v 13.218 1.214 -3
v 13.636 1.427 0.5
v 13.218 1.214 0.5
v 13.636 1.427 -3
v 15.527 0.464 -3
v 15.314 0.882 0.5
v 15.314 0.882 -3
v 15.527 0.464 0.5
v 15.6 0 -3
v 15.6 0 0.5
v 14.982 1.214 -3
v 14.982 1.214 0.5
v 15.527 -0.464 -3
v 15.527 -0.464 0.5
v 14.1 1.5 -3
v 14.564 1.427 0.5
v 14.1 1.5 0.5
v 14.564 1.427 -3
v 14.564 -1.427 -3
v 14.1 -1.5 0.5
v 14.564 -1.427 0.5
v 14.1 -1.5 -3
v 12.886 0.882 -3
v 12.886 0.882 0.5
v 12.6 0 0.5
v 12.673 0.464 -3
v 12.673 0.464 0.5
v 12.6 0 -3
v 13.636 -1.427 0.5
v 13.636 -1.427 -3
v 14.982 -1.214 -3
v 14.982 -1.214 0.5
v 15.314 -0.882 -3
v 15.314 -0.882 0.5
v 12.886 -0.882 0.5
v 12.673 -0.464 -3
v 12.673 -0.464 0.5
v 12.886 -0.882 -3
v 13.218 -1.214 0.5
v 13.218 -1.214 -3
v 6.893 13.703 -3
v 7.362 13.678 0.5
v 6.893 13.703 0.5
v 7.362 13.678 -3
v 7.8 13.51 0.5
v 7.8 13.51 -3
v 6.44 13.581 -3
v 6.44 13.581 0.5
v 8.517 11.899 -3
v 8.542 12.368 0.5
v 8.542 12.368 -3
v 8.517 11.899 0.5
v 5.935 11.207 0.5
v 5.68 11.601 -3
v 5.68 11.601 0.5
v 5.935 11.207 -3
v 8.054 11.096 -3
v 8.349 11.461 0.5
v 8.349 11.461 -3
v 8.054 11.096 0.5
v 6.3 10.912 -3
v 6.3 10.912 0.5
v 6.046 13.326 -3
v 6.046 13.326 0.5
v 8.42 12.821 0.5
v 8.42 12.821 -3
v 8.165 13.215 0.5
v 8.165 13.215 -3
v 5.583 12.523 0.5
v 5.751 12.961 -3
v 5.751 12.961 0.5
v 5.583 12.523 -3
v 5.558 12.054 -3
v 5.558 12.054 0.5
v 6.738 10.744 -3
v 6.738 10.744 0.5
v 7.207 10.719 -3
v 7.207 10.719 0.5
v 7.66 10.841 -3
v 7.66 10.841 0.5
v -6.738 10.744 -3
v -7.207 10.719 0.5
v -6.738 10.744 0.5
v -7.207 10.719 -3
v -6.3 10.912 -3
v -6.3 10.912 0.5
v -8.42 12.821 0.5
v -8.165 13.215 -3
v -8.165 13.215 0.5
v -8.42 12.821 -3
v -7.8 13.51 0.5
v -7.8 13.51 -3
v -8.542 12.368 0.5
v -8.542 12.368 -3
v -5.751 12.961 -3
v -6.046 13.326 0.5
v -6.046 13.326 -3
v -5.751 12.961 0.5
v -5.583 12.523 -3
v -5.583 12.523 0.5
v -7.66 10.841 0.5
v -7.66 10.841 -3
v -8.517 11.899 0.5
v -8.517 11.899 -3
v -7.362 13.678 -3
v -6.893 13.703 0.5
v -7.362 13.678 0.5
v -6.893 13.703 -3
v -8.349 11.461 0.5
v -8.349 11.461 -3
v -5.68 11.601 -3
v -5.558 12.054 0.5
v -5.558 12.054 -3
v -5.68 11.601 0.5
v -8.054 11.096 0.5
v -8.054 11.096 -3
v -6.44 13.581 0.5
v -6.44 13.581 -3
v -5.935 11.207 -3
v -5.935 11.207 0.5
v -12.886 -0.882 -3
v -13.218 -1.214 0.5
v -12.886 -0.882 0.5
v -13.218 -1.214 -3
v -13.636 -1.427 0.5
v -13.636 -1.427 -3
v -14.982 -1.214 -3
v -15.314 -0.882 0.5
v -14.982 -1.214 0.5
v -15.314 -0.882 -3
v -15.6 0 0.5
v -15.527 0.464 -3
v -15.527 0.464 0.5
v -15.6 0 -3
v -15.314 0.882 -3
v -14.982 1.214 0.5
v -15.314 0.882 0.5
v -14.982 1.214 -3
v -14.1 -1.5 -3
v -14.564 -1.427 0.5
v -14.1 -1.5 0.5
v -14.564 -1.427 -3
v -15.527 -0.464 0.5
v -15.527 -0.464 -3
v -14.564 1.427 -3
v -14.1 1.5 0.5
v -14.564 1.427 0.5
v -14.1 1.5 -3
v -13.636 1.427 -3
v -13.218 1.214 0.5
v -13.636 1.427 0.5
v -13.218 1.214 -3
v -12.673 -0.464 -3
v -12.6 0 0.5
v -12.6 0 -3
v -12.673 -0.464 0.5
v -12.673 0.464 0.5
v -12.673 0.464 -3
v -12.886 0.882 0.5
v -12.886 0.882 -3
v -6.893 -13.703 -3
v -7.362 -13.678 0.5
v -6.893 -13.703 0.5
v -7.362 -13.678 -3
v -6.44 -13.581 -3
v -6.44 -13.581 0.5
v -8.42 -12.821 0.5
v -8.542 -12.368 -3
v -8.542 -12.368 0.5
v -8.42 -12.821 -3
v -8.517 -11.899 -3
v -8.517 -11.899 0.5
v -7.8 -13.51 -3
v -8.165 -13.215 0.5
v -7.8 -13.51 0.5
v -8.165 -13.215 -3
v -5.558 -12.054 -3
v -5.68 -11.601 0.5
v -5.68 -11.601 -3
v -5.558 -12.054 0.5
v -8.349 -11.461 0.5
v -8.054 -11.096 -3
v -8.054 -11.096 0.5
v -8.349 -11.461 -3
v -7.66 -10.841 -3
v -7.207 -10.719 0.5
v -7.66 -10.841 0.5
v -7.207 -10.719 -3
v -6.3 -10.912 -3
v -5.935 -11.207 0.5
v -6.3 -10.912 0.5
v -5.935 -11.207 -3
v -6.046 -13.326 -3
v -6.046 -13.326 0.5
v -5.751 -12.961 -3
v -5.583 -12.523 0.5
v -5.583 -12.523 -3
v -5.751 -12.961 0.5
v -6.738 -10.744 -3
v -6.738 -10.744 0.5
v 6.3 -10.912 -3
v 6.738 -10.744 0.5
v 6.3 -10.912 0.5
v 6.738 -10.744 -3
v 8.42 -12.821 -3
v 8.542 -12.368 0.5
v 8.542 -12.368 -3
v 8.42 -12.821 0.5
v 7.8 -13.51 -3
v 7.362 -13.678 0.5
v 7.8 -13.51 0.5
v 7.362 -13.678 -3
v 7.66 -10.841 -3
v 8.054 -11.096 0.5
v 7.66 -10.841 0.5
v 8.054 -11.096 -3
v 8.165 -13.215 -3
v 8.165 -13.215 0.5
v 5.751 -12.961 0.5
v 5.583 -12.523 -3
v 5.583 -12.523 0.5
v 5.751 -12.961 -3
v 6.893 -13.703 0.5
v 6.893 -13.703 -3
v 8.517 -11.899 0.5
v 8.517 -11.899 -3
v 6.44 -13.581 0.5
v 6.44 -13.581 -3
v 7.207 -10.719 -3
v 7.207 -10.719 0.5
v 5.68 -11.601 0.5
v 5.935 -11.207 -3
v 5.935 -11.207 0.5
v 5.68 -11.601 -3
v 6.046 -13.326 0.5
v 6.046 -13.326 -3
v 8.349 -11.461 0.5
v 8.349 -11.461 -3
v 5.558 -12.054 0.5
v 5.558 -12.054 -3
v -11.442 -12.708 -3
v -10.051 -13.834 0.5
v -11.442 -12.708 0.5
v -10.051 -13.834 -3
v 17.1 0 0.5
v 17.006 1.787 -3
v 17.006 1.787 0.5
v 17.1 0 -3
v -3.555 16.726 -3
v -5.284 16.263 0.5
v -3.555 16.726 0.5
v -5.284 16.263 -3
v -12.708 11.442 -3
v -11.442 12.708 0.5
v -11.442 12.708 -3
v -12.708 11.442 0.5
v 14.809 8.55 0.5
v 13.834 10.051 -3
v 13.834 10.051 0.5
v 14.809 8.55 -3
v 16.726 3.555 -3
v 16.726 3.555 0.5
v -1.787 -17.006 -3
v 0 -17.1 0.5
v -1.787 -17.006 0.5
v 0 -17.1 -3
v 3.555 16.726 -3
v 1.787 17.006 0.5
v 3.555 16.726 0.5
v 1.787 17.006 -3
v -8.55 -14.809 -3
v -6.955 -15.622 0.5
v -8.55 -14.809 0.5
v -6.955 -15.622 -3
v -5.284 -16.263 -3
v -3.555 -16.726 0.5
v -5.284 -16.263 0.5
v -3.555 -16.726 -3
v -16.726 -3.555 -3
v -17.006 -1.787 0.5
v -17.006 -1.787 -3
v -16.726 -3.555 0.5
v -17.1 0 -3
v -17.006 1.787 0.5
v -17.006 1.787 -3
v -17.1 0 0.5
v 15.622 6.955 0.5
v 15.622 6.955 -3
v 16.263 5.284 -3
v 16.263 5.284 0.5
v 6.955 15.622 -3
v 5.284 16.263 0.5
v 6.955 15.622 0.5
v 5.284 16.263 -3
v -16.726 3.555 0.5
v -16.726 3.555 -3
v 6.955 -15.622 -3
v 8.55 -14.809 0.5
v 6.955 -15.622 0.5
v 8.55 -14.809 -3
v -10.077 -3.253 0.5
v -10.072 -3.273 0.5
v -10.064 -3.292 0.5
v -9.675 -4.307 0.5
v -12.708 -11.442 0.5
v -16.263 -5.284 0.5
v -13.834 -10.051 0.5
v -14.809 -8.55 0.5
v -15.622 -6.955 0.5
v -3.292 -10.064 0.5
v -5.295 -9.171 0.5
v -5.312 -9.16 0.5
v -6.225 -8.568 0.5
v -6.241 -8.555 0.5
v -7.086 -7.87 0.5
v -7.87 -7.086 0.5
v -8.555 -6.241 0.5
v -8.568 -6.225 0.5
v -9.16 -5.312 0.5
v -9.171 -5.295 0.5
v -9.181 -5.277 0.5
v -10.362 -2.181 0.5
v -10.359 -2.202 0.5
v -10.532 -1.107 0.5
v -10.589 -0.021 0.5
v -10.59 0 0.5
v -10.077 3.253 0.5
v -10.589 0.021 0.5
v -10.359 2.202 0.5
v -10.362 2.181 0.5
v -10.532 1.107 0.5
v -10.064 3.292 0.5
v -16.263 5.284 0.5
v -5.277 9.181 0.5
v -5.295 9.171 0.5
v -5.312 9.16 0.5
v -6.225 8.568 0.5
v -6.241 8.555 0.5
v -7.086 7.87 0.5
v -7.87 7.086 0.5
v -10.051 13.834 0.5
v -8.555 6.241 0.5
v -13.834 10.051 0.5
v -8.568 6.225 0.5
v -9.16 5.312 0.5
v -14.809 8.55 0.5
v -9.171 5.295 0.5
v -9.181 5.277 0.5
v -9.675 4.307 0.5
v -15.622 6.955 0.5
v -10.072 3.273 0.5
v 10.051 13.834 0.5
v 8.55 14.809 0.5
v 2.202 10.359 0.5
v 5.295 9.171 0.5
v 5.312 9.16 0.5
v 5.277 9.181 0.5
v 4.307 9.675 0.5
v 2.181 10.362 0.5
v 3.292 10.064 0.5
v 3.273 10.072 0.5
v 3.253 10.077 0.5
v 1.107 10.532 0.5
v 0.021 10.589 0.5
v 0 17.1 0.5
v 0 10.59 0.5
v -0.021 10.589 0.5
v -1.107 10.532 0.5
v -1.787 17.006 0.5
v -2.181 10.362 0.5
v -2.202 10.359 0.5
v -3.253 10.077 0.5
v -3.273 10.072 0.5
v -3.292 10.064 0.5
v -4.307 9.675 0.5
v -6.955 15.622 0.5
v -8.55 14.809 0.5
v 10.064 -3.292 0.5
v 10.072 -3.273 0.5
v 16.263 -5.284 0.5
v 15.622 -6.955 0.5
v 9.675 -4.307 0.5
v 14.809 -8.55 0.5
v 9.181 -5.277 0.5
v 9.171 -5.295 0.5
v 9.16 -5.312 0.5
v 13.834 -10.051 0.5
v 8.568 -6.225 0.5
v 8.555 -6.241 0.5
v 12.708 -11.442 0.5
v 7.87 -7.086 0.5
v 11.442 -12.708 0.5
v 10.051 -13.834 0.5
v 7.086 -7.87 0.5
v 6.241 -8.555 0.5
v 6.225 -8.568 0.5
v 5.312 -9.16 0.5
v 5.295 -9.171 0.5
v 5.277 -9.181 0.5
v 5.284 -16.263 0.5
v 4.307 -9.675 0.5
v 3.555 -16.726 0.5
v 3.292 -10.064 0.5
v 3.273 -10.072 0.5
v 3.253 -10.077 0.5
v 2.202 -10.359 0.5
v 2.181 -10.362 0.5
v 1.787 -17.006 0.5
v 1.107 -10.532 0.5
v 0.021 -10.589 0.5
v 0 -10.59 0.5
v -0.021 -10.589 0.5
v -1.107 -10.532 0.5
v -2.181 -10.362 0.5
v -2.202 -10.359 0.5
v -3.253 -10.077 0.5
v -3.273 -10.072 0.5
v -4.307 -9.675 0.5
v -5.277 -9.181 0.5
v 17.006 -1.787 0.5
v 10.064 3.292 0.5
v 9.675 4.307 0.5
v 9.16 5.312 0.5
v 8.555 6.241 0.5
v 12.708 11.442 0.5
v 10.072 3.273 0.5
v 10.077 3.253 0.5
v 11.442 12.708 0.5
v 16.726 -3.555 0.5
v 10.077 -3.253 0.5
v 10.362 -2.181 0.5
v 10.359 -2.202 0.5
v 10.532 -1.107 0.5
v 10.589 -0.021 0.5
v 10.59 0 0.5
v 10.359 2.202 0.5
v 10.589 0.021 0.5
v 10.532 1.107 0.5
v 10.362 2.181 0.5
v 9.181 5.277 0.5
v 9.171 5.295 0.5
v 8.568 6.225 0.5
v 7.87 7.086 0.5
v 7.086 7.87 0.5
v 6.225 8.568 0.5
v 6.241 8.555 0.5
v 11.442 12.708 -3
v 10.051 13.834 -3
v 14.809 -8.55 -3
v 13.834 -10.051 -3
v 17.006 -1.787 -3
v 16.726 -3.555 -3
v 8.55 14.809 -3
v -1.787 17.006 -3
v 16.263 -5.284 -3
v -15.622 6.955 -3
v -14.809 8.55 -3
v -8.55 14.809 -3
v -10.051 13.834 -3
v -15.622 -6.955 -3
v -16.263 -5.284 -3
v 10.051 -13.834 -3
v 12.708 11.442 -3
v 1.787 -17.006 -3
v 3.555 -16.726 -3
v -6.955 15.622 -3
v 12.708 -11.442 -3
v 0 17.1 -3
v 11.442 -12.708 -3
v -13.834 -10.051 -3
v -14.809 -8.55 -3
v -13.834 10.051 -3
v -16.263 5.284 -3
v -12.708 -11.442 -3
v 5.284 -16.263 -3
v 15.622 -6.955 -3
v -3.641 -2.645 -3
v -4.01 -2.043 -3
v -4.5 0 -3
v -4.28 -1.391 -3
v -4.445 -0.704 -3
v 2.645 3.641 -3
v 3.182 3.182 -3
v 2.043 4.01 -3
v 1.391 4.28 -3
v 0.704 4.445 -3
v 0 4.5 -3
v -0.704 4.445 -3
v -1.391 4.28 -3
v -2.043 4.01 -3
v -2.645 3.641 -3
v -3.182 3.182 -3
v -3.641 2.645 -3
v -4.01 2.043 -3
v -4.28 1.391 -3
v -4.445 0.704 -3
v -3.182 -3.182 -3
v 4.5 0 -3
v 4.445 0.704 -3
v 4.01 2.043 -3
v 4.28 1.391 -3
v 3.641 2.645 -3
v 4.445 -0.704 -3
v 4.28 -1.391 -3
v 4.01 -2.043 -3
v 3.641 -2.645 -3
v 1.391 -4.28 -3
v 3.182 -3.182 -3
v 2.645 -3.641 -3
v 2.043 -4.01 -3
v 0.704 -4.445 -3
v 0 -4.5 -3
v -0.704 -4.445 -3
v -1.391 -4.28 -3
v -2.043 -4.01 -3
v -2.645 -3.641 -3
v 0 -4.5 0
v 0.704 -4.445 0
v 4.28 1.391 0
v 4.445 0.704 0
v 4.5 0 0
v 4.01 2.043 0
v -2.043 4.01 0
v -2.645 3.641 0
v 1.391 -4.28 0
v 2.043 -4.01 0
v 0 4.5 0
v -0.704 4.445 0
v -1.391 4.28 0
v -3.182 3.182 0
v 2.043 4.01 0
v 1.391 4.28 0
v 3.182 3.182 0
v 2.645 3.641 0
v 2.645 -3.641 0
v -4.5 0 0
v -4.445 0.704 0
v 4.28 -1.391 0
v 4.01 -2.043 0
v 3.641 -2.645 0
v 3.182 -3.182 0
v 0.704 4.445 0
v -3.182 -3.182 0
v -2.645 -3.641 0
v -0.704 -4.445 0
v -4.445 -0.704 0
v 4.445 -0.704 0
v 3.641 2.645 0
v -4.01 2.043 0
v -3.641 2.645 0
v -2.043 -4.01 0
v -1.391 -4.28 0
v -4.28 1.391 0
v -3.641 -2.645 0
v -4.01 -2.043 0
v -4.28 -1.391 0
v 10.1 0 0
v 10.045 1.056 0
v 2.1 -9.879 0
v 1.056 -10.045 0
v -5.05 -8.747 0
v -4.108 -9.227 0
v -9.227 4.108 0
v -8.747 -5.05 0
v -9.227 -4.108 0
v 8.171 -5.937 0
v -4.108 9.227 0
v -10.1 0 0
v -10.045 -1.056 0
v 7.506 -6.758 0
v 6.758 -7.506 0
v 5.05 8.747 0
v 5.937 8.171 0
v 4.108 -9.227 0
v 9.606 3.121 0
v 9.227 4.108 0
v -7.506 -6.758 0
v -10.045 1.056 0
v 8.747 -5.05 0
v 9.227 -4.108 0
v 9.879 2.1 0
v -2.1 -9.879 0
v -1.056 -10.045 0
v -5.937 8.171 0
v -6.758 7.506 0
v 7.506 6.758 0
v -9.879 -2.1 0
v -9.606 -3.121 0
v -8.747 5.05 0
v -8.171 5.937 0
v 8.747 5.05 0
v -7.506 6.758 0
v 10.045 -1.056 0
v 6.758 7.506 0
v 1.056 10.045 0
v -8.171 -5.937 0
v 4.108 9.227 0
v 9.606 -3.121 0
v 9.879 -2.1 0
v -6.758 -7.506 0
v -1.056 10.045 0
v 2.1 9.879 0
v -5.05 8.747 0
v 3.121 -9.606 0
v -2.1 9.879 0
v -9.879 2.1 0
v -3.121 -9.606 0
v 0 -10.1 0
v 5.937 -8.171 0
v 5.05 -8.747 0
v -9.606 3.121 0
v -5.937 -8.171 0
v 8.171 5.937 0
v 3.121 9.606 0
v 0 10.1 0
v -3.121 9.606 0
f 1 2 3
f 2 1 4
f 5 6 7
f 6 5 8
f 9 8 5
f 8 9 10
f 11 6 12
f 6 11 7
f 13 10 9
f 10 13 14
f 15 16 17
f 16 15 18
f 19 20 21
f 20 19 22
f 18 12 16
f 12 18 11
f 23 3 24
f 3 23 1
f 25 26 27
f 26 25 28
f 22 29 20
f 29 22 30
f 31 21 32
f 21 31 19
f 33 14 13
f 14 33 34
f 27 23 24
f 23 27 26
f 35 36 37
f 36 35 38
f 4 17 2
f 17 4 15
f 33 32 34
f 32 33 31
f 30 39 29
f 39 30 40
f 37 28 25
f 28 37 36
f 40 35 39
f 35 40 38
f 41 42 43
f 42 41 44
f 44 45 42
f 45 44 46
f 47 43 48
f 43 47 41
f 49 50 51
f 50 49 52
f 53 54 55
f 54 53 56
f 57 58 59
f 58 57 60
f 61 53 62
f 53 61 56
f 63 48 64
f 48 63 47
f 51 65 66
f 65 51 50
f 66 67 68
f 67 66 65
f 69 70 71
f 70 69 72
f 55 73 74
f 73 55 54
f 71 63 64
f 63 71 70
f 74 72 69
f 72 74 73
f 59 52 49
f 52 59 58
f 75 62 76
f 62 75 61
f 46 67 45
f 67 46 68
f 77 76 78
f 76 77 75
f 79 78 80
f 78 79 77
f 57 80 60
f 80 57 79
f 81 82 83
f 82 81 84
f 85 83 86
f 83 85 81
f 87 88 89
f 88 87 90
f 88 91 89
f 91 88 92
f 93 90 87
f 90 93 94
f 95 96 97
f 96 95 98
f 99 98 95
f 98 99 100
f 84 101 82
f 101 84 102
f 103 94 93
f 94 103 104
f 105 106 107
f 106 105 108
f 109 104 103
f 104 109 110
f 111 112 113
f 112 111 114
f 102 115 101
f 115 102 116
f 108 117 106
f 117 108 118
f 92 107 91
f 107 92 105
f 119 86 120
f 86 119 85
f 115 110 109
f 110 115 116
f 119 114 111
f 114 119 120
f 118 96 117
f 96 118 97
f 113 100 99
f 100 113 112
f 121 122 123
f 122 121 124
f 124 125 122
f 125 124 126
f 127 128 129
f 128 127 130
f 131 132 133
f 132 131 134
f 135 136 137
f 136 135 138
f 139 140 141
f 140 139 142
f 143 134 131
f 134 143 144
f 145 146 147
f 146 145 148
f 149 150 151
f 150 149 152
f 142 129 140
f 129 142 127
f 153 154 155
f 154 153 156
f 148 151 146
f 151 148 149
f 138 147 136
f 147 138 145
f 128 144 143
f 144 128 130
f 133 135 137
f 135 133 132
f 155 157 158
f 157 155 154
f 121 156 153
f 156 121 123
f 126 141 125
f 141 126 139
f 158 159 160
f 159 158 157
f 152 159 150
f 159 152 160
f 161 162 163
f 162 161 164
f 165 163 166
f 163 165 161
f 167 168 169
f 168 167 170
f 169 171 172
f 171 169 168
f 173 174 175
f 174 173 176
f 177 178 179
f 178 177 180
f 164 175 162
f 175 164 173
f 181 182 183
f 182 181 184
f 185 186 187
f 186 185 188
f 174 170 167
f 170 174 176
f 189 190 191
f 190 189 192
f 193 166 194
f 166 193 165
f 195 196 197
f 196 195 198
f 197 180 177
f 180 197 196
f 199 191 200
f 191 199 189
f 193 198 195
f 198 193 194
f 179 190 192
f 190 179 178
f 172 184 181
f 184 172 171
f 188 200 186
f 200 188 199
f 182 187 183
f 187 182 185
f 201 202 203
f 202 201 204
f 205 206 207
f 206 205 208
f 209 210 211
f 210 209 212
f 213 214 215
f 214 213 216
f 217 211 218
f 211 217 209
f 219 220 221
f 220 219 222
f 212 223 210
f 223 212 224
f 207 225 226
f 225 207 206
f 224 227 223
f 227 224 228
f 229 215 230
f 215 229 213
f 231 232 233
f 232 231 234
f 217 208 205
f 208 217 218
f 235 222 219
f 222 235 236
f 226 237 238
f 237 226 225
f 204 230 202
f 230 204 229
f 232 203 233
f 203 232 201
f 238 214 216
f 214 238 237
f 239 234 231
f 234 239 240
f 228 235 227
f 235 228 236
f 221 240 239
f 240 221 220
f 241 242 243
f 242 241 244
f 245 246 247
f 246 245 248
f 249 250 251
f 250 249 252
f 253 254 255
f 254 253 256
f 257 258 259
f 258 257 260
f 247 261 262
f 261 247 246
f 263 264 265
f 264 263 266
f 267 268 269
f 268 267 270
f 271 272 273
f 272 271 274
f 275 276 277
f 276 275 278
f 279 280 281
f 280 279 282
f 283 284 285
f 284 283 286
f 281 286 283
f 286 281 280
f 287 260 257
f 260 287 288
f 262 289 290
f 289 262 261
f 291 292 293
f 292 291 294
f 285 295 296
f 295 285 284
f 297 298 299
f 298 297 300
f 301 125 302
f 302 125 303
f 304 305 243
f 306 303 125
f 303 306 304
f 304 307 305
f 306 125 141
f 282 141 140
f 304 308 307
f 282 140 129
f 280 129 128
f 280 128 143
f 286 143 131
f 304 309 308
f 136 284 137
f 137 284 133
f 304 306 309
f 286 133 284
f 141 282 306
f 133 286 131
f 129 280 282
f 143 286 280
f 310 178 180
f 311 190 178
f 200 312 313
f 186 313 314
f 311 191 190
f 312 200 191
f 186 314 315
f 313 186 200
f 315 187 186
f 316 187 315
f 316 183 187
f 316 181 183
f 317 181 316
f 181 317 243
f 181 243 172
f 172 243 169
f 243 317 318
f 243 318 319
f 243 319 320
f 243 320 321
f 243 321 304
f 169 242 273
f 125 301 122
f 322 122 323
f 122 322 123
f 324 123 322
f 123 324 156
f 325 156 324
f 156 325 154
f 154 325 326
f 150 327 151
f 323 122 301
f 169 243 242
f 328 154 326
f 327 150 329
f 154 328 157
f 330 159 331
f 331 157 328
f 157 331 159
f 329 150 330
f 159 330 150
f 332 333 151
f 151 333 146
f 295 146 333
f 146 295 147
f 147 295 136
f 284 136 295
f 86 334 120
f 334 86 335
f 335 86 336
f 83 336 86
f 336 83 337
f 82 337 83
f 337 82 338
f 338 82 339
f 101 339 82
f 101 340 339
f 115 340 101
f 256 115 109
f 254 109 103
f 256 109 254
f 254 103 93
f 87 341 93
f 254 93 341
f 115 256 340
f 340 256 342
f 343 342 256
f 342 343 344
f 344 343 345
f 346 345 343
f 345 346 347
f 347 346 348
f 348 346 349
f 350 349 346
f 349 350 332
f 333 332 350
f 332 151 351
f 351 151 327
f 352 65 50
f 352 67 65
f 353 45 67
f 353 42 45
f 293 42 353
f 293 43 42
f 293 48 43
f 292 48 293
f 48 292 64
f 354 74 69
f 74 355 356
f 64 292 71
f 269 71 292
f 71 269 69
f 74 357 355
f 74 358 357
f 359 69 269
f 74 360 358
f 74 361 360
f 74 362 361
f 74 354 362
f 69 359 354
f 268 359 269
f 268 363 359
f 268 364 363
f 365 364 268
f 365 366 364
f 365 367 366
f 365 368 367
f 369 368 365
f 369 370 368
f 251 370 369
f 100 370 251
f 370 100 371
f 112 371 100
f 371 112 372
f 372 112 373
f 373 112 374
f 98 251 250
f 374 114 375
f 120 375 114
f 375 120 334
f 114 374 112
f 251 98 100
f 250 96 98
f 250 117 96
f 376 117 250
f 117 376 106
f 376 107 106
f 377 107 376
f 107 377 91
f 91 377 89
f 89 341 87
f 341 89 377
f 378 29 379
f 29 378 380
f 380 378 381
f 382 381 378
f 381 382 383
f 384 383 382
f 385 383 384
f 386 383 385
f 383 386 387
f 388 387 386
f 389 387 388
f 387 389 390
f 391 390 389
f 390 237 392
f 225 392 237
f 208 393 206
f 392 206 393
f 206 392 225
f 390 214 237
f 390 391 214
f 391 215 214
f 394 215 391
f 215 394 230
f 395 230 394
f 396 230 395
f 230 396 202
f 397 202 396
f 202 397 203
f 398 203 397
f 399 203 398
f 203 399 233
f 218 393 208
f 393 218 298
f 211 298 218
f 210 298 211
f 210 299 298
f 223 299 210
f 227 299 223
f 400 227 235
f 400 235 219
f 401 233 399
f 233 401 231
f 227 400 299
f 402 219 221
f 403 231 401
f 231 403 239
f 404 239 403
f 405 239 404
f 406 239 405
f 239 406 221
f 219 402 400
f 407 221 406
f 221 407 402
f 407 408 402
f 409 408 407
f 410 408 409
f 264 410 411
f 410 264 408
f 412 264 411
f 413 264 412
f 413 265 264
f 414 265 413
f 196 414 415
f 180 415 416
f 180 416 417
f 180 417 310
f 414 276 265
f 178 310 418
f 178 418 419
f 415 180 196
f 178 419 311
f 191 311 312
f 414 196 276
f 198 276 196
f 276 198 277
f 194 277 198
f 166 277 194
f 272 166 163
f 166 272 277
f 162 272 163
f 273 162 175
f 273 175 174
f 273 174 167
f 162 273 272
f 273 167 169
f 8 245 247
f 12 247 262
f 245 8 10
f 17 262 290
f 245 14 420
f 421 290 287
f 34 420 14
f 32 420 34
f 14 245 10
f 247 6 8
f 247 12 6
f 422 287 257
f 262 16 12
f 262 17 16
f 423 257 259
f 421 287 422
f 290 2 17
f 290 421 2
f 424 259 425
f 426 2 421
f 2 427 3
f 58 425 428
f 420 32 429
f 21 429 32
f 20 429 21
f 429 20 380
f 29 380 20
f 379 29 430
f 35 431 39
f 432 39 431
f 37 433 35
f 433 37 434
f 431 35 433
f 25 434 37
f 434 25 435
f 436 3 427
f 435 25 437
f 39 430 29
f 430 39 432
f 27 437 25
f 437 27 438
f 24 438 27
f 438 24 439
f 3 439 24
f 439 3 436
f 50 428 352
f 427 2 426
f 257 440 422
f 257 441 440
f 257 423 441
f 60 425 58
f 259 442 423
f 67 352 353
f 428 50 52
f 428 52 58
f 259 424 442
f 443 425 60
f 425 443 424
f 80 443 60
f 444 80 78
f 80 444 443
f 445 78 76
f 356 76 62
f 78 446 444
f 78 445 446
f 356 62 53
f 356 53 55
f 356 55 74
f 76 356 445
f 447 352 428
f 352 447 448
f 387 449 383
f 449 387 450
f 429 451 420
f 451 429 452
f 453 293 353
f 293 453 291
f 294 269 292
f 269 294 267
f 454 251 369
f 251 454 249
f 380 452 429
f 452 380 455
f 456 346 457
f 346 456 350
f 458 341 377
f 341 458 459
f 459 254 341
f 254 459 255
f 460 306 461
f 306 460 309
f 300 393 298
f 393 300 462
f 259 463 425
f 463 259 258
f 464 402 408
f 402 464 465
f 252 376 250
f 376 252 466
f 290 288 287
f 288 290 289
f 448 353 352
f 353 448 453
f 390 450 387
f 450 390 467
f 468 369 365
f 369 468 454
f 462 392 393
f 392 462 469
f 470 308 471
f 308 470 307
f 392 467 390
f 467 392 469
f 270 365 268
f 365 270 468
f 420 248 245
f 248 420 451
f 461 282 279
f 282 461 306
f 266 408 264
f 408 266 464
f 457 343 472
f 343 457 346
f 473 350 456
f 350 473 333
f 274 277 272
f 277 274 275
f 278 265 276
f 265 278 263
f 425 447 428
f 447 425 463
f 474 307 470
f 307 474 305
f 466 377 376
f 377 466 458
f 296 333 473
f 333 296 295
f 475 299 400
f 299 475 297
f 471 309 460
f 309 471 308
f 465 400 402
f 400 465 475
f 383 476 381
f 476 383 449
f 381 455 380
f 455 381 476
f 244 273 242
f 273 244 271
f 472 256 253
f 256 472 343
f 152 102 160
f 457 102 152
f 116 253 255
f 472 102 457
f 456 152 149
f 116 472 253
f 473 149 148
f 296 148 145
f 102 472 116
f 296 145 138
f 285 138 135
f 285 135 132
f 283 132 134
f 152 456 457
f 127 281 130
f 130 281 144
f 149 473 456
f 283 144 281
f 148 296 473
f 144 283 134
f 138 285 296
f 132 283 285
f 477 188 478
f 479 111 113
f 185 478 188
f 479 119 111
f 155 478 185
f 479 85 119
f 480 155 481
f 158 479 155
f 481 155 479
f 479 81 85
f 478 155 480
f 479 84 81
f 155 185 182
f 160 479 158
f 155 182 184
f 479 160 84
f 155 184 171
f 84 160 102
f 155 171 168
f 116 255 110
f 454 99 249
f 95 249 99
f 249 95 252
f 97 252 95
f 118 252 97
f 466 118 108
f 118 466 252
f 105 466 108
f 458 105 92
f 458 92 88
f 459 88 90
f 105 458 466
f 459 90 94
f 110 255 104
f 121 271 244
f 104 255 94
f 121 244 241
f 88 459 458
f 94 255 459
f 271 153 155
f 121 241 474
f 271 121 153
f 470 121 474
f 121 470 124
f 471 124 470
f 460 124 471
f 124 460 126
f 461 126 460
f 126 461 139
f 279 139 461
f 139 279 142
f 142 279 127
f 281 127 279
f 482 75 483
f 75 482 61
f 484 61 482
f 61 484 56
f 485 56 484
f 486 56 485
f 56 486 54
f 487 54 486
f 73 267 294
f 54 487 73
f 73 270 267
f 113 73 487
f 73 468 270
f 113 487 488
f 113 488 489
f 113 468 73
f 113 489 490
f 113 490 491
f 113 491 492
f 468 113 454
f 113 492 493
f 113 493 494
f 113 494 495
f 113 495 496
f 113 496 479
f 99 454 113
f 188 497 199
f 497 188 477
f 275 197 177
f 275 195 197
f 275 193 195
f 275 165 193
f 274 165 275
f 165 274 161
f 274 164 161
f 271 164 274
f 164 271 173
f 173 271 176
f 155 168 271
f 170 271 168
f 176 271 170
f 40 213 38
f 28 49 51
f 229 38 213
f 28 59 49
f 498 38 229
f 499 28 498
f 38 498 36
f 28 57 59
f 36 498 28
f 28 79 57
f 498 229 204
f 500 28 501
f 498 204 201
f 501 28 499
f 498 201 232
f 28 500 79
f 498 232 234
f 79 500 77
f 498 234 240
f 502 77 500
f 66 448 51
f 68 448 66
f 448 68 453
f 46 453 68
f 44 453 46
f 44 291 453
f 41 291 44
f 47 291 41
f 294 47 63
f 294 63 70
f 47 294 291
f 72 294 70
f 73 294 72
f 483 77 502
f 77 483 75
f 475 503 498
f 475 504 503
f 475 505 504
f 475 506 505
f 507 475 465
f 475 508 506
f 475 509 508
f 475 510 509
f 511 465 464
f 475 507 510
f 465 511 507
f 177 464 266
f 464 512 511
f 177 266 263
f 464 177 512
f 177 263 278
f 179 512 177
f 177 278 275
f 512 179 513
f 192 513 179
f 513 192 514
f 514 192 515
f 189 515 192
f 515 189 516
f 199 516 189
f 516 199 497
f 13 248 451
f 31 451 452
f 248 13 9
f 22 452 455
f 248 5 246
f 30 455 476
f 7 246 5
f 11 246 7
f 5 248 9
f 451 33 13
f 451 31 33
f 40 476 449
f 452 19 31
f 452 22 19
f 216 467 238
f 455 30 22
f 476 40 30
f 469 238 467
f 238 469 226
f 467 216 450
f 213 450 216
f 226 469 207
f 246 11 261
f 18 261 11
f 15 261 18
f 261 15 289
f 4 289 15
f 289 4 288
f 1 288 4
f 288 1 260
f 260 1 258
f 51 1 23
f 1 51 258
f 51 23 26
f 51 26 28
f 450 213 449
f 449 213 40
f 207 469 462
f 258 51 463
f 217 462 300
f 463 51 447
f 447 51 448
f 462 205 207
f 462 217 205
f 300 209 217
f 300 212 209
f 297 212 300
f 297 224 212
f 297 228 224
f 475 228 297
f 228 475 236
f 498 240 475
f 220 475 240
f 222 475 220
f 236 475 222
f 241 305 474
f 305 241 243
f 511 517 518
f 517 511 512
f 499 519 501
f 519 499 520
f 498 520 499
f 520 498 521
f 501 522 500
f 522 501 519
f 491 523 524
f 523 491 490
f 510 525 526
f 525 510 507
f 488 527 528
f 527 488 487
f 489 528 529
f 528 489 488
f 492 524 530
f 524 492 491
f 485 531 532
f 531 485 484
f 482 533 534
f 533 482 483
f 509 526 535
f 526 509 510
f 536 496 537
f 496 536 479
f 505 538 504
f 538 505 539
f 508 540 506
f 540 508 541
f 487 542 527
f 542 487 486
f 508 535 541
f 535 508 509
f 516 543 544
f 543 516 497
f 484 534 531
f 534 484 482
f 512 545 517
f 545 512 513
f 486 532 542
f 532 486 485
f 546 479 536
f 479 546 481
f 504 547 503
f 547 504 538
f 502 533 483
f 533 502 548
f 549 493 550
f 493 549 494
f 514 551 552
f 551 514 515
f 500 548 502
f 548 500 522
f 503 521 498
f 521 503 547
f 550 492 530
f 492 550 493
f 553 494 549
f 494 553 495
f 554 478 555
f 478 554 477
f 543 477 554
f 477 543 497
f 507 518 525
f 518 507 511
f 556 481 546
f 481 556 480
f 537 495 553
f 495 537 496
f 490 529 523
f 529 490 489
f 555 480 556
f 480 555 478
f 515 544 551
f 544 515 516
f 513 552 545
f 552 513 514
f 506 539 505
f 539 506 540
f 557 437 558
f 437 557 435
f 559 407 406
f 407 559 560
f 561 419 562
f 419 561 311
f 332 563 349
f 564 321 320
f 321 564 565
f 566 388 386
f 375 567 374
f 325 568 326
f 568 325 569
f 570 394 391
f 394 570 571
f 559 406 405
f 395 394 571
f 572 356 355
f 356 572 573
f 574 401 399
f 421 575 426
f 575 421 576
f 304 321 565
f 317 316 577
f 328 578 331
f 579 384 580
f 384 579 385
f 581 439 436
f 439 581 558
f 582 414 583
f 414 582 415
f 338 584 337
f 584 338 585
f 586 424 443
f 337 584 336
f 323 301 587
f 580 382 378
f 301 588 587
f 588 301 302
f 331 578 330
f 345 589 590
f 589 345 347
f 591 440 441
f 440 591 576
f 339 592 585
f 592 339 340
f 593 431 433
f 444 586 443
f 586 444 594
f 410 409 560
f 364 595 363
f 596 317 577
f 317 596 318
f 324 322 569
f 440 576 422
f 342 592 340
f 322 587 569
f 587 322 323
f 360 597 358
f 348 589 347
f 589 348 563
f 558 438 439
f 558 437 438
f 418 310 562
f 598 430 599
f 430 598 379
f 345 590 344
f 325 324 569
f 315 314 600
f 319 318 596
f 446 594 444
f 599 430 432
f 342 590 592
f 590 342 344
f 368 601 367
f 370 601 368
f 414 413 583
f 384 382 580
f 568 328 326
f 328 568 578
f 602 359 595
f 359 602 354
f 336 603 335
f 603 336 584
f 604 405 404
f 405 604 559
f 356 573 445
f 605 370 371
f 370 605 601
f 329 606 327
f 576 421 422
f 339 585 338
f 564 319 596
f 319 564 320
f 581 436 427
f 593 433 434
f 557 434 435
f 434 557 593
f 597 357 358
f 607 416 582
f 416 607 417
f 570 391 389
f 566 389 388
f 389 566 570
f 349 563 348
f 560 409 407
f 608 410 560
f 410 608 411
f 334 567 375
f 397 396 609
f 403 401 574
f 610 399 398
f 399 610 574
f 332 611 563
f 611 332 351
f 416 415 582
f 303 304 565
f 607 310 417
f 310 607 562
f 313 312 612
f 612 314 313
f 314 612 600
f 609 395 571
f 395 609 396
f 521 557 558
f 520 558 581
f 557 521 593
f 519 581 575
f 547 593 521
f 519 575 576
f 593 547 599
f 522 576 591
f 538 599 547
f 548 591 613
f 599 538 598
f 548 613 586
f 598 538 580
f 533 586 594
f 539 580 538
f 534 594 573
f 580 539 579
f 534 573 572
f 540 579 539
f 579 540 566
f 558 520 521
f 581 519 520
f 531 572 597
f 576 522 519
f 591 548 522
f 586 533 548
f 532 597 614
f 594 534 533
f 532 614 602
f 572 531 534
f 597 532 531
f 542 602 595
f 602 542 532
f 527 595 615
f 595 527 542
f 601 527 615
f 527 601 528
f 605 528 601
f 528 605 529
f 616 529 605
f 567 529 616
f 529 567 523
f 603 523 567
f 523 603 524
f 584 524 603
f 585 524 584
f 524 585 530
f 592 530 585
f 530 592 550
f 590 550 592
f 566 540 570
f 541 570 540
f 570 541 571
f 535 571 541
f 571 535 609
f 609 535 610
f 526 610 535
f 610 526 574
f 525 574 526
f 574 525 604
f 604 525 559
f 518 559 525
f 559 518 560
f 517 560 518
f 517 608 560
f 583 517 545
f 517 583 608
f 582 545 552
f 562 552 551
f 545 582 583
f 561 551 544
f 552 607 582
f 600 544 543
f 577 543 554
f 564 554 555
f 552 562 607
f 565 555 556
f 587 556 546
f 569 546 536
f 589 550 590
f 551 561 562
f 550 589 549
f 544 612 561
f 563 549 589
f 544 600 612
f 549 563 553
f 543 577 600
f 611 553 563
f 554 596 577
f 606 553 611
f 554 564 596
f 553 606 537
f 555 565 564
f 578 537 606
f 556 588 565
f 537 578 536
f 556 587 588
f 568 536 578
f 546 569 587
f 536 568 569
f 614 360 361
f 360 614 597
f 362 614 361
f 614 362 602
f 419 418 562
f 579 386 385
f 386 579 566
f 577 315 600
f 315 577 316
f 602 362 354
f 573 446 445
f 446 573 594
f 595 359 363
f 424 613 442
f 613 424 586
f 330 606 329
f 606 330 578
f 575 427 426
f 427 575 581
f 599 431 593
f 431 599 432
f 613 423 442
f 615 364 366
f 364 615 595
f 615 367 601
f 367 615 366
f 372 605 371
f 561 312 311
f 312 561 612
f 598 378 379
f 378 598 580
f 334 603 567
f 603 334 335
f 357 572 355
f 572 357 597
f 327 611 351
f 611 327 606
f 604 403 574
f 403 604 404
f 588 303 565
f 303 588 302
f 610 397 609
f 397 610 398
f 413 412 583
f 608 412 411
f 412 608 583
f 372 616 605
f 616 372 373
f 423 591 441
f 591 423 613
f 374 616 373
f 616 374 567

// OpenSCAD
od=inches(4);
od2=od-4.4;
bd=22.2;
bd2=bd+12;
bt=7;
thick=40;
holes=6;
hod=(od2-bd2)/2-6;
hr=(360/holes);

!mirror([0,0,1]) cap();
//translate([0,0,7]) cap();
for(m=[0]) mirror([0,0,m])
{
  difference() { union() {
    difference() {
      cylinder(d=od,h=thick/2,$fn=100);
      translate([0,0,-.01]) cylinder(d=od2,h=thick/2+.02,$fn=100);
    }
    difference() {
      cylinder(d=bd2,h=bt-.02,$fn=60);
    }
    difference() {
      cylinder(d=od2,h=2,$fn=100);
      for(hi=[0:holes-1])
        rotate([0,0,hi*hr]) translate([od2/2-bd2/2,0,-.01]) cylinder(d=hod,h=3,$fn=40);
    }
    for(hi=[0:holes-1])
    {
      rotate([0,0,hi*hr+hr/2]) translate([bd2/2,-1.1]) cube([od2/2-bd2/2,2.2,7]);
      rotate([0,0,hi*hr+hr/2]) translate([od/2-4.4,0]) linear_extrude(thick/2) {
        difference() {
          hull() {
          translate([2,-6]) square([2,12]);
          circle(d=6,$fn=30);
          }
          *cylinder(d=6,h=thick/2,$fn=30);
        }
      }
    }
  }
  cylinder(d=8,h=thick,$fn=40);
      translate([0,0,-.01]) cylinder(d=bd,h=bt,$fn=60);
  for(r=[0:hr:359]) rotate([0,0,r+hr/2]) translate([od/2-4.4,0,-.01]) cylinder(d=3,h=thick/2+.02,$fn=20);
  for(r=[0:60:359]) rotate([0,0,r]) translate([bd2/2-3,0,-.01]) cylinder(d=3,h=bt+3,$fn=20);
  }
}

module cap()
{
  difference() {
    translate([0,0,-.5]) cylinder(d=bd2,h=3.5,$fn=60);
    translate([0,0,-.01]) cylinder(d=9,h=3.02,$fn=40);
    for(r=[0:60:359]) rotate([0,0,r]) translate([bd2/2-3,0,-.51]) cylinder(d=3,h=bt+3,$fn=20);
    mirror([0,0,1]) cylinder(d1=bd-2,d2=bd-1,h=.51,$fn=60);
  }
}
  
function inches(in) = in * 25.4;
